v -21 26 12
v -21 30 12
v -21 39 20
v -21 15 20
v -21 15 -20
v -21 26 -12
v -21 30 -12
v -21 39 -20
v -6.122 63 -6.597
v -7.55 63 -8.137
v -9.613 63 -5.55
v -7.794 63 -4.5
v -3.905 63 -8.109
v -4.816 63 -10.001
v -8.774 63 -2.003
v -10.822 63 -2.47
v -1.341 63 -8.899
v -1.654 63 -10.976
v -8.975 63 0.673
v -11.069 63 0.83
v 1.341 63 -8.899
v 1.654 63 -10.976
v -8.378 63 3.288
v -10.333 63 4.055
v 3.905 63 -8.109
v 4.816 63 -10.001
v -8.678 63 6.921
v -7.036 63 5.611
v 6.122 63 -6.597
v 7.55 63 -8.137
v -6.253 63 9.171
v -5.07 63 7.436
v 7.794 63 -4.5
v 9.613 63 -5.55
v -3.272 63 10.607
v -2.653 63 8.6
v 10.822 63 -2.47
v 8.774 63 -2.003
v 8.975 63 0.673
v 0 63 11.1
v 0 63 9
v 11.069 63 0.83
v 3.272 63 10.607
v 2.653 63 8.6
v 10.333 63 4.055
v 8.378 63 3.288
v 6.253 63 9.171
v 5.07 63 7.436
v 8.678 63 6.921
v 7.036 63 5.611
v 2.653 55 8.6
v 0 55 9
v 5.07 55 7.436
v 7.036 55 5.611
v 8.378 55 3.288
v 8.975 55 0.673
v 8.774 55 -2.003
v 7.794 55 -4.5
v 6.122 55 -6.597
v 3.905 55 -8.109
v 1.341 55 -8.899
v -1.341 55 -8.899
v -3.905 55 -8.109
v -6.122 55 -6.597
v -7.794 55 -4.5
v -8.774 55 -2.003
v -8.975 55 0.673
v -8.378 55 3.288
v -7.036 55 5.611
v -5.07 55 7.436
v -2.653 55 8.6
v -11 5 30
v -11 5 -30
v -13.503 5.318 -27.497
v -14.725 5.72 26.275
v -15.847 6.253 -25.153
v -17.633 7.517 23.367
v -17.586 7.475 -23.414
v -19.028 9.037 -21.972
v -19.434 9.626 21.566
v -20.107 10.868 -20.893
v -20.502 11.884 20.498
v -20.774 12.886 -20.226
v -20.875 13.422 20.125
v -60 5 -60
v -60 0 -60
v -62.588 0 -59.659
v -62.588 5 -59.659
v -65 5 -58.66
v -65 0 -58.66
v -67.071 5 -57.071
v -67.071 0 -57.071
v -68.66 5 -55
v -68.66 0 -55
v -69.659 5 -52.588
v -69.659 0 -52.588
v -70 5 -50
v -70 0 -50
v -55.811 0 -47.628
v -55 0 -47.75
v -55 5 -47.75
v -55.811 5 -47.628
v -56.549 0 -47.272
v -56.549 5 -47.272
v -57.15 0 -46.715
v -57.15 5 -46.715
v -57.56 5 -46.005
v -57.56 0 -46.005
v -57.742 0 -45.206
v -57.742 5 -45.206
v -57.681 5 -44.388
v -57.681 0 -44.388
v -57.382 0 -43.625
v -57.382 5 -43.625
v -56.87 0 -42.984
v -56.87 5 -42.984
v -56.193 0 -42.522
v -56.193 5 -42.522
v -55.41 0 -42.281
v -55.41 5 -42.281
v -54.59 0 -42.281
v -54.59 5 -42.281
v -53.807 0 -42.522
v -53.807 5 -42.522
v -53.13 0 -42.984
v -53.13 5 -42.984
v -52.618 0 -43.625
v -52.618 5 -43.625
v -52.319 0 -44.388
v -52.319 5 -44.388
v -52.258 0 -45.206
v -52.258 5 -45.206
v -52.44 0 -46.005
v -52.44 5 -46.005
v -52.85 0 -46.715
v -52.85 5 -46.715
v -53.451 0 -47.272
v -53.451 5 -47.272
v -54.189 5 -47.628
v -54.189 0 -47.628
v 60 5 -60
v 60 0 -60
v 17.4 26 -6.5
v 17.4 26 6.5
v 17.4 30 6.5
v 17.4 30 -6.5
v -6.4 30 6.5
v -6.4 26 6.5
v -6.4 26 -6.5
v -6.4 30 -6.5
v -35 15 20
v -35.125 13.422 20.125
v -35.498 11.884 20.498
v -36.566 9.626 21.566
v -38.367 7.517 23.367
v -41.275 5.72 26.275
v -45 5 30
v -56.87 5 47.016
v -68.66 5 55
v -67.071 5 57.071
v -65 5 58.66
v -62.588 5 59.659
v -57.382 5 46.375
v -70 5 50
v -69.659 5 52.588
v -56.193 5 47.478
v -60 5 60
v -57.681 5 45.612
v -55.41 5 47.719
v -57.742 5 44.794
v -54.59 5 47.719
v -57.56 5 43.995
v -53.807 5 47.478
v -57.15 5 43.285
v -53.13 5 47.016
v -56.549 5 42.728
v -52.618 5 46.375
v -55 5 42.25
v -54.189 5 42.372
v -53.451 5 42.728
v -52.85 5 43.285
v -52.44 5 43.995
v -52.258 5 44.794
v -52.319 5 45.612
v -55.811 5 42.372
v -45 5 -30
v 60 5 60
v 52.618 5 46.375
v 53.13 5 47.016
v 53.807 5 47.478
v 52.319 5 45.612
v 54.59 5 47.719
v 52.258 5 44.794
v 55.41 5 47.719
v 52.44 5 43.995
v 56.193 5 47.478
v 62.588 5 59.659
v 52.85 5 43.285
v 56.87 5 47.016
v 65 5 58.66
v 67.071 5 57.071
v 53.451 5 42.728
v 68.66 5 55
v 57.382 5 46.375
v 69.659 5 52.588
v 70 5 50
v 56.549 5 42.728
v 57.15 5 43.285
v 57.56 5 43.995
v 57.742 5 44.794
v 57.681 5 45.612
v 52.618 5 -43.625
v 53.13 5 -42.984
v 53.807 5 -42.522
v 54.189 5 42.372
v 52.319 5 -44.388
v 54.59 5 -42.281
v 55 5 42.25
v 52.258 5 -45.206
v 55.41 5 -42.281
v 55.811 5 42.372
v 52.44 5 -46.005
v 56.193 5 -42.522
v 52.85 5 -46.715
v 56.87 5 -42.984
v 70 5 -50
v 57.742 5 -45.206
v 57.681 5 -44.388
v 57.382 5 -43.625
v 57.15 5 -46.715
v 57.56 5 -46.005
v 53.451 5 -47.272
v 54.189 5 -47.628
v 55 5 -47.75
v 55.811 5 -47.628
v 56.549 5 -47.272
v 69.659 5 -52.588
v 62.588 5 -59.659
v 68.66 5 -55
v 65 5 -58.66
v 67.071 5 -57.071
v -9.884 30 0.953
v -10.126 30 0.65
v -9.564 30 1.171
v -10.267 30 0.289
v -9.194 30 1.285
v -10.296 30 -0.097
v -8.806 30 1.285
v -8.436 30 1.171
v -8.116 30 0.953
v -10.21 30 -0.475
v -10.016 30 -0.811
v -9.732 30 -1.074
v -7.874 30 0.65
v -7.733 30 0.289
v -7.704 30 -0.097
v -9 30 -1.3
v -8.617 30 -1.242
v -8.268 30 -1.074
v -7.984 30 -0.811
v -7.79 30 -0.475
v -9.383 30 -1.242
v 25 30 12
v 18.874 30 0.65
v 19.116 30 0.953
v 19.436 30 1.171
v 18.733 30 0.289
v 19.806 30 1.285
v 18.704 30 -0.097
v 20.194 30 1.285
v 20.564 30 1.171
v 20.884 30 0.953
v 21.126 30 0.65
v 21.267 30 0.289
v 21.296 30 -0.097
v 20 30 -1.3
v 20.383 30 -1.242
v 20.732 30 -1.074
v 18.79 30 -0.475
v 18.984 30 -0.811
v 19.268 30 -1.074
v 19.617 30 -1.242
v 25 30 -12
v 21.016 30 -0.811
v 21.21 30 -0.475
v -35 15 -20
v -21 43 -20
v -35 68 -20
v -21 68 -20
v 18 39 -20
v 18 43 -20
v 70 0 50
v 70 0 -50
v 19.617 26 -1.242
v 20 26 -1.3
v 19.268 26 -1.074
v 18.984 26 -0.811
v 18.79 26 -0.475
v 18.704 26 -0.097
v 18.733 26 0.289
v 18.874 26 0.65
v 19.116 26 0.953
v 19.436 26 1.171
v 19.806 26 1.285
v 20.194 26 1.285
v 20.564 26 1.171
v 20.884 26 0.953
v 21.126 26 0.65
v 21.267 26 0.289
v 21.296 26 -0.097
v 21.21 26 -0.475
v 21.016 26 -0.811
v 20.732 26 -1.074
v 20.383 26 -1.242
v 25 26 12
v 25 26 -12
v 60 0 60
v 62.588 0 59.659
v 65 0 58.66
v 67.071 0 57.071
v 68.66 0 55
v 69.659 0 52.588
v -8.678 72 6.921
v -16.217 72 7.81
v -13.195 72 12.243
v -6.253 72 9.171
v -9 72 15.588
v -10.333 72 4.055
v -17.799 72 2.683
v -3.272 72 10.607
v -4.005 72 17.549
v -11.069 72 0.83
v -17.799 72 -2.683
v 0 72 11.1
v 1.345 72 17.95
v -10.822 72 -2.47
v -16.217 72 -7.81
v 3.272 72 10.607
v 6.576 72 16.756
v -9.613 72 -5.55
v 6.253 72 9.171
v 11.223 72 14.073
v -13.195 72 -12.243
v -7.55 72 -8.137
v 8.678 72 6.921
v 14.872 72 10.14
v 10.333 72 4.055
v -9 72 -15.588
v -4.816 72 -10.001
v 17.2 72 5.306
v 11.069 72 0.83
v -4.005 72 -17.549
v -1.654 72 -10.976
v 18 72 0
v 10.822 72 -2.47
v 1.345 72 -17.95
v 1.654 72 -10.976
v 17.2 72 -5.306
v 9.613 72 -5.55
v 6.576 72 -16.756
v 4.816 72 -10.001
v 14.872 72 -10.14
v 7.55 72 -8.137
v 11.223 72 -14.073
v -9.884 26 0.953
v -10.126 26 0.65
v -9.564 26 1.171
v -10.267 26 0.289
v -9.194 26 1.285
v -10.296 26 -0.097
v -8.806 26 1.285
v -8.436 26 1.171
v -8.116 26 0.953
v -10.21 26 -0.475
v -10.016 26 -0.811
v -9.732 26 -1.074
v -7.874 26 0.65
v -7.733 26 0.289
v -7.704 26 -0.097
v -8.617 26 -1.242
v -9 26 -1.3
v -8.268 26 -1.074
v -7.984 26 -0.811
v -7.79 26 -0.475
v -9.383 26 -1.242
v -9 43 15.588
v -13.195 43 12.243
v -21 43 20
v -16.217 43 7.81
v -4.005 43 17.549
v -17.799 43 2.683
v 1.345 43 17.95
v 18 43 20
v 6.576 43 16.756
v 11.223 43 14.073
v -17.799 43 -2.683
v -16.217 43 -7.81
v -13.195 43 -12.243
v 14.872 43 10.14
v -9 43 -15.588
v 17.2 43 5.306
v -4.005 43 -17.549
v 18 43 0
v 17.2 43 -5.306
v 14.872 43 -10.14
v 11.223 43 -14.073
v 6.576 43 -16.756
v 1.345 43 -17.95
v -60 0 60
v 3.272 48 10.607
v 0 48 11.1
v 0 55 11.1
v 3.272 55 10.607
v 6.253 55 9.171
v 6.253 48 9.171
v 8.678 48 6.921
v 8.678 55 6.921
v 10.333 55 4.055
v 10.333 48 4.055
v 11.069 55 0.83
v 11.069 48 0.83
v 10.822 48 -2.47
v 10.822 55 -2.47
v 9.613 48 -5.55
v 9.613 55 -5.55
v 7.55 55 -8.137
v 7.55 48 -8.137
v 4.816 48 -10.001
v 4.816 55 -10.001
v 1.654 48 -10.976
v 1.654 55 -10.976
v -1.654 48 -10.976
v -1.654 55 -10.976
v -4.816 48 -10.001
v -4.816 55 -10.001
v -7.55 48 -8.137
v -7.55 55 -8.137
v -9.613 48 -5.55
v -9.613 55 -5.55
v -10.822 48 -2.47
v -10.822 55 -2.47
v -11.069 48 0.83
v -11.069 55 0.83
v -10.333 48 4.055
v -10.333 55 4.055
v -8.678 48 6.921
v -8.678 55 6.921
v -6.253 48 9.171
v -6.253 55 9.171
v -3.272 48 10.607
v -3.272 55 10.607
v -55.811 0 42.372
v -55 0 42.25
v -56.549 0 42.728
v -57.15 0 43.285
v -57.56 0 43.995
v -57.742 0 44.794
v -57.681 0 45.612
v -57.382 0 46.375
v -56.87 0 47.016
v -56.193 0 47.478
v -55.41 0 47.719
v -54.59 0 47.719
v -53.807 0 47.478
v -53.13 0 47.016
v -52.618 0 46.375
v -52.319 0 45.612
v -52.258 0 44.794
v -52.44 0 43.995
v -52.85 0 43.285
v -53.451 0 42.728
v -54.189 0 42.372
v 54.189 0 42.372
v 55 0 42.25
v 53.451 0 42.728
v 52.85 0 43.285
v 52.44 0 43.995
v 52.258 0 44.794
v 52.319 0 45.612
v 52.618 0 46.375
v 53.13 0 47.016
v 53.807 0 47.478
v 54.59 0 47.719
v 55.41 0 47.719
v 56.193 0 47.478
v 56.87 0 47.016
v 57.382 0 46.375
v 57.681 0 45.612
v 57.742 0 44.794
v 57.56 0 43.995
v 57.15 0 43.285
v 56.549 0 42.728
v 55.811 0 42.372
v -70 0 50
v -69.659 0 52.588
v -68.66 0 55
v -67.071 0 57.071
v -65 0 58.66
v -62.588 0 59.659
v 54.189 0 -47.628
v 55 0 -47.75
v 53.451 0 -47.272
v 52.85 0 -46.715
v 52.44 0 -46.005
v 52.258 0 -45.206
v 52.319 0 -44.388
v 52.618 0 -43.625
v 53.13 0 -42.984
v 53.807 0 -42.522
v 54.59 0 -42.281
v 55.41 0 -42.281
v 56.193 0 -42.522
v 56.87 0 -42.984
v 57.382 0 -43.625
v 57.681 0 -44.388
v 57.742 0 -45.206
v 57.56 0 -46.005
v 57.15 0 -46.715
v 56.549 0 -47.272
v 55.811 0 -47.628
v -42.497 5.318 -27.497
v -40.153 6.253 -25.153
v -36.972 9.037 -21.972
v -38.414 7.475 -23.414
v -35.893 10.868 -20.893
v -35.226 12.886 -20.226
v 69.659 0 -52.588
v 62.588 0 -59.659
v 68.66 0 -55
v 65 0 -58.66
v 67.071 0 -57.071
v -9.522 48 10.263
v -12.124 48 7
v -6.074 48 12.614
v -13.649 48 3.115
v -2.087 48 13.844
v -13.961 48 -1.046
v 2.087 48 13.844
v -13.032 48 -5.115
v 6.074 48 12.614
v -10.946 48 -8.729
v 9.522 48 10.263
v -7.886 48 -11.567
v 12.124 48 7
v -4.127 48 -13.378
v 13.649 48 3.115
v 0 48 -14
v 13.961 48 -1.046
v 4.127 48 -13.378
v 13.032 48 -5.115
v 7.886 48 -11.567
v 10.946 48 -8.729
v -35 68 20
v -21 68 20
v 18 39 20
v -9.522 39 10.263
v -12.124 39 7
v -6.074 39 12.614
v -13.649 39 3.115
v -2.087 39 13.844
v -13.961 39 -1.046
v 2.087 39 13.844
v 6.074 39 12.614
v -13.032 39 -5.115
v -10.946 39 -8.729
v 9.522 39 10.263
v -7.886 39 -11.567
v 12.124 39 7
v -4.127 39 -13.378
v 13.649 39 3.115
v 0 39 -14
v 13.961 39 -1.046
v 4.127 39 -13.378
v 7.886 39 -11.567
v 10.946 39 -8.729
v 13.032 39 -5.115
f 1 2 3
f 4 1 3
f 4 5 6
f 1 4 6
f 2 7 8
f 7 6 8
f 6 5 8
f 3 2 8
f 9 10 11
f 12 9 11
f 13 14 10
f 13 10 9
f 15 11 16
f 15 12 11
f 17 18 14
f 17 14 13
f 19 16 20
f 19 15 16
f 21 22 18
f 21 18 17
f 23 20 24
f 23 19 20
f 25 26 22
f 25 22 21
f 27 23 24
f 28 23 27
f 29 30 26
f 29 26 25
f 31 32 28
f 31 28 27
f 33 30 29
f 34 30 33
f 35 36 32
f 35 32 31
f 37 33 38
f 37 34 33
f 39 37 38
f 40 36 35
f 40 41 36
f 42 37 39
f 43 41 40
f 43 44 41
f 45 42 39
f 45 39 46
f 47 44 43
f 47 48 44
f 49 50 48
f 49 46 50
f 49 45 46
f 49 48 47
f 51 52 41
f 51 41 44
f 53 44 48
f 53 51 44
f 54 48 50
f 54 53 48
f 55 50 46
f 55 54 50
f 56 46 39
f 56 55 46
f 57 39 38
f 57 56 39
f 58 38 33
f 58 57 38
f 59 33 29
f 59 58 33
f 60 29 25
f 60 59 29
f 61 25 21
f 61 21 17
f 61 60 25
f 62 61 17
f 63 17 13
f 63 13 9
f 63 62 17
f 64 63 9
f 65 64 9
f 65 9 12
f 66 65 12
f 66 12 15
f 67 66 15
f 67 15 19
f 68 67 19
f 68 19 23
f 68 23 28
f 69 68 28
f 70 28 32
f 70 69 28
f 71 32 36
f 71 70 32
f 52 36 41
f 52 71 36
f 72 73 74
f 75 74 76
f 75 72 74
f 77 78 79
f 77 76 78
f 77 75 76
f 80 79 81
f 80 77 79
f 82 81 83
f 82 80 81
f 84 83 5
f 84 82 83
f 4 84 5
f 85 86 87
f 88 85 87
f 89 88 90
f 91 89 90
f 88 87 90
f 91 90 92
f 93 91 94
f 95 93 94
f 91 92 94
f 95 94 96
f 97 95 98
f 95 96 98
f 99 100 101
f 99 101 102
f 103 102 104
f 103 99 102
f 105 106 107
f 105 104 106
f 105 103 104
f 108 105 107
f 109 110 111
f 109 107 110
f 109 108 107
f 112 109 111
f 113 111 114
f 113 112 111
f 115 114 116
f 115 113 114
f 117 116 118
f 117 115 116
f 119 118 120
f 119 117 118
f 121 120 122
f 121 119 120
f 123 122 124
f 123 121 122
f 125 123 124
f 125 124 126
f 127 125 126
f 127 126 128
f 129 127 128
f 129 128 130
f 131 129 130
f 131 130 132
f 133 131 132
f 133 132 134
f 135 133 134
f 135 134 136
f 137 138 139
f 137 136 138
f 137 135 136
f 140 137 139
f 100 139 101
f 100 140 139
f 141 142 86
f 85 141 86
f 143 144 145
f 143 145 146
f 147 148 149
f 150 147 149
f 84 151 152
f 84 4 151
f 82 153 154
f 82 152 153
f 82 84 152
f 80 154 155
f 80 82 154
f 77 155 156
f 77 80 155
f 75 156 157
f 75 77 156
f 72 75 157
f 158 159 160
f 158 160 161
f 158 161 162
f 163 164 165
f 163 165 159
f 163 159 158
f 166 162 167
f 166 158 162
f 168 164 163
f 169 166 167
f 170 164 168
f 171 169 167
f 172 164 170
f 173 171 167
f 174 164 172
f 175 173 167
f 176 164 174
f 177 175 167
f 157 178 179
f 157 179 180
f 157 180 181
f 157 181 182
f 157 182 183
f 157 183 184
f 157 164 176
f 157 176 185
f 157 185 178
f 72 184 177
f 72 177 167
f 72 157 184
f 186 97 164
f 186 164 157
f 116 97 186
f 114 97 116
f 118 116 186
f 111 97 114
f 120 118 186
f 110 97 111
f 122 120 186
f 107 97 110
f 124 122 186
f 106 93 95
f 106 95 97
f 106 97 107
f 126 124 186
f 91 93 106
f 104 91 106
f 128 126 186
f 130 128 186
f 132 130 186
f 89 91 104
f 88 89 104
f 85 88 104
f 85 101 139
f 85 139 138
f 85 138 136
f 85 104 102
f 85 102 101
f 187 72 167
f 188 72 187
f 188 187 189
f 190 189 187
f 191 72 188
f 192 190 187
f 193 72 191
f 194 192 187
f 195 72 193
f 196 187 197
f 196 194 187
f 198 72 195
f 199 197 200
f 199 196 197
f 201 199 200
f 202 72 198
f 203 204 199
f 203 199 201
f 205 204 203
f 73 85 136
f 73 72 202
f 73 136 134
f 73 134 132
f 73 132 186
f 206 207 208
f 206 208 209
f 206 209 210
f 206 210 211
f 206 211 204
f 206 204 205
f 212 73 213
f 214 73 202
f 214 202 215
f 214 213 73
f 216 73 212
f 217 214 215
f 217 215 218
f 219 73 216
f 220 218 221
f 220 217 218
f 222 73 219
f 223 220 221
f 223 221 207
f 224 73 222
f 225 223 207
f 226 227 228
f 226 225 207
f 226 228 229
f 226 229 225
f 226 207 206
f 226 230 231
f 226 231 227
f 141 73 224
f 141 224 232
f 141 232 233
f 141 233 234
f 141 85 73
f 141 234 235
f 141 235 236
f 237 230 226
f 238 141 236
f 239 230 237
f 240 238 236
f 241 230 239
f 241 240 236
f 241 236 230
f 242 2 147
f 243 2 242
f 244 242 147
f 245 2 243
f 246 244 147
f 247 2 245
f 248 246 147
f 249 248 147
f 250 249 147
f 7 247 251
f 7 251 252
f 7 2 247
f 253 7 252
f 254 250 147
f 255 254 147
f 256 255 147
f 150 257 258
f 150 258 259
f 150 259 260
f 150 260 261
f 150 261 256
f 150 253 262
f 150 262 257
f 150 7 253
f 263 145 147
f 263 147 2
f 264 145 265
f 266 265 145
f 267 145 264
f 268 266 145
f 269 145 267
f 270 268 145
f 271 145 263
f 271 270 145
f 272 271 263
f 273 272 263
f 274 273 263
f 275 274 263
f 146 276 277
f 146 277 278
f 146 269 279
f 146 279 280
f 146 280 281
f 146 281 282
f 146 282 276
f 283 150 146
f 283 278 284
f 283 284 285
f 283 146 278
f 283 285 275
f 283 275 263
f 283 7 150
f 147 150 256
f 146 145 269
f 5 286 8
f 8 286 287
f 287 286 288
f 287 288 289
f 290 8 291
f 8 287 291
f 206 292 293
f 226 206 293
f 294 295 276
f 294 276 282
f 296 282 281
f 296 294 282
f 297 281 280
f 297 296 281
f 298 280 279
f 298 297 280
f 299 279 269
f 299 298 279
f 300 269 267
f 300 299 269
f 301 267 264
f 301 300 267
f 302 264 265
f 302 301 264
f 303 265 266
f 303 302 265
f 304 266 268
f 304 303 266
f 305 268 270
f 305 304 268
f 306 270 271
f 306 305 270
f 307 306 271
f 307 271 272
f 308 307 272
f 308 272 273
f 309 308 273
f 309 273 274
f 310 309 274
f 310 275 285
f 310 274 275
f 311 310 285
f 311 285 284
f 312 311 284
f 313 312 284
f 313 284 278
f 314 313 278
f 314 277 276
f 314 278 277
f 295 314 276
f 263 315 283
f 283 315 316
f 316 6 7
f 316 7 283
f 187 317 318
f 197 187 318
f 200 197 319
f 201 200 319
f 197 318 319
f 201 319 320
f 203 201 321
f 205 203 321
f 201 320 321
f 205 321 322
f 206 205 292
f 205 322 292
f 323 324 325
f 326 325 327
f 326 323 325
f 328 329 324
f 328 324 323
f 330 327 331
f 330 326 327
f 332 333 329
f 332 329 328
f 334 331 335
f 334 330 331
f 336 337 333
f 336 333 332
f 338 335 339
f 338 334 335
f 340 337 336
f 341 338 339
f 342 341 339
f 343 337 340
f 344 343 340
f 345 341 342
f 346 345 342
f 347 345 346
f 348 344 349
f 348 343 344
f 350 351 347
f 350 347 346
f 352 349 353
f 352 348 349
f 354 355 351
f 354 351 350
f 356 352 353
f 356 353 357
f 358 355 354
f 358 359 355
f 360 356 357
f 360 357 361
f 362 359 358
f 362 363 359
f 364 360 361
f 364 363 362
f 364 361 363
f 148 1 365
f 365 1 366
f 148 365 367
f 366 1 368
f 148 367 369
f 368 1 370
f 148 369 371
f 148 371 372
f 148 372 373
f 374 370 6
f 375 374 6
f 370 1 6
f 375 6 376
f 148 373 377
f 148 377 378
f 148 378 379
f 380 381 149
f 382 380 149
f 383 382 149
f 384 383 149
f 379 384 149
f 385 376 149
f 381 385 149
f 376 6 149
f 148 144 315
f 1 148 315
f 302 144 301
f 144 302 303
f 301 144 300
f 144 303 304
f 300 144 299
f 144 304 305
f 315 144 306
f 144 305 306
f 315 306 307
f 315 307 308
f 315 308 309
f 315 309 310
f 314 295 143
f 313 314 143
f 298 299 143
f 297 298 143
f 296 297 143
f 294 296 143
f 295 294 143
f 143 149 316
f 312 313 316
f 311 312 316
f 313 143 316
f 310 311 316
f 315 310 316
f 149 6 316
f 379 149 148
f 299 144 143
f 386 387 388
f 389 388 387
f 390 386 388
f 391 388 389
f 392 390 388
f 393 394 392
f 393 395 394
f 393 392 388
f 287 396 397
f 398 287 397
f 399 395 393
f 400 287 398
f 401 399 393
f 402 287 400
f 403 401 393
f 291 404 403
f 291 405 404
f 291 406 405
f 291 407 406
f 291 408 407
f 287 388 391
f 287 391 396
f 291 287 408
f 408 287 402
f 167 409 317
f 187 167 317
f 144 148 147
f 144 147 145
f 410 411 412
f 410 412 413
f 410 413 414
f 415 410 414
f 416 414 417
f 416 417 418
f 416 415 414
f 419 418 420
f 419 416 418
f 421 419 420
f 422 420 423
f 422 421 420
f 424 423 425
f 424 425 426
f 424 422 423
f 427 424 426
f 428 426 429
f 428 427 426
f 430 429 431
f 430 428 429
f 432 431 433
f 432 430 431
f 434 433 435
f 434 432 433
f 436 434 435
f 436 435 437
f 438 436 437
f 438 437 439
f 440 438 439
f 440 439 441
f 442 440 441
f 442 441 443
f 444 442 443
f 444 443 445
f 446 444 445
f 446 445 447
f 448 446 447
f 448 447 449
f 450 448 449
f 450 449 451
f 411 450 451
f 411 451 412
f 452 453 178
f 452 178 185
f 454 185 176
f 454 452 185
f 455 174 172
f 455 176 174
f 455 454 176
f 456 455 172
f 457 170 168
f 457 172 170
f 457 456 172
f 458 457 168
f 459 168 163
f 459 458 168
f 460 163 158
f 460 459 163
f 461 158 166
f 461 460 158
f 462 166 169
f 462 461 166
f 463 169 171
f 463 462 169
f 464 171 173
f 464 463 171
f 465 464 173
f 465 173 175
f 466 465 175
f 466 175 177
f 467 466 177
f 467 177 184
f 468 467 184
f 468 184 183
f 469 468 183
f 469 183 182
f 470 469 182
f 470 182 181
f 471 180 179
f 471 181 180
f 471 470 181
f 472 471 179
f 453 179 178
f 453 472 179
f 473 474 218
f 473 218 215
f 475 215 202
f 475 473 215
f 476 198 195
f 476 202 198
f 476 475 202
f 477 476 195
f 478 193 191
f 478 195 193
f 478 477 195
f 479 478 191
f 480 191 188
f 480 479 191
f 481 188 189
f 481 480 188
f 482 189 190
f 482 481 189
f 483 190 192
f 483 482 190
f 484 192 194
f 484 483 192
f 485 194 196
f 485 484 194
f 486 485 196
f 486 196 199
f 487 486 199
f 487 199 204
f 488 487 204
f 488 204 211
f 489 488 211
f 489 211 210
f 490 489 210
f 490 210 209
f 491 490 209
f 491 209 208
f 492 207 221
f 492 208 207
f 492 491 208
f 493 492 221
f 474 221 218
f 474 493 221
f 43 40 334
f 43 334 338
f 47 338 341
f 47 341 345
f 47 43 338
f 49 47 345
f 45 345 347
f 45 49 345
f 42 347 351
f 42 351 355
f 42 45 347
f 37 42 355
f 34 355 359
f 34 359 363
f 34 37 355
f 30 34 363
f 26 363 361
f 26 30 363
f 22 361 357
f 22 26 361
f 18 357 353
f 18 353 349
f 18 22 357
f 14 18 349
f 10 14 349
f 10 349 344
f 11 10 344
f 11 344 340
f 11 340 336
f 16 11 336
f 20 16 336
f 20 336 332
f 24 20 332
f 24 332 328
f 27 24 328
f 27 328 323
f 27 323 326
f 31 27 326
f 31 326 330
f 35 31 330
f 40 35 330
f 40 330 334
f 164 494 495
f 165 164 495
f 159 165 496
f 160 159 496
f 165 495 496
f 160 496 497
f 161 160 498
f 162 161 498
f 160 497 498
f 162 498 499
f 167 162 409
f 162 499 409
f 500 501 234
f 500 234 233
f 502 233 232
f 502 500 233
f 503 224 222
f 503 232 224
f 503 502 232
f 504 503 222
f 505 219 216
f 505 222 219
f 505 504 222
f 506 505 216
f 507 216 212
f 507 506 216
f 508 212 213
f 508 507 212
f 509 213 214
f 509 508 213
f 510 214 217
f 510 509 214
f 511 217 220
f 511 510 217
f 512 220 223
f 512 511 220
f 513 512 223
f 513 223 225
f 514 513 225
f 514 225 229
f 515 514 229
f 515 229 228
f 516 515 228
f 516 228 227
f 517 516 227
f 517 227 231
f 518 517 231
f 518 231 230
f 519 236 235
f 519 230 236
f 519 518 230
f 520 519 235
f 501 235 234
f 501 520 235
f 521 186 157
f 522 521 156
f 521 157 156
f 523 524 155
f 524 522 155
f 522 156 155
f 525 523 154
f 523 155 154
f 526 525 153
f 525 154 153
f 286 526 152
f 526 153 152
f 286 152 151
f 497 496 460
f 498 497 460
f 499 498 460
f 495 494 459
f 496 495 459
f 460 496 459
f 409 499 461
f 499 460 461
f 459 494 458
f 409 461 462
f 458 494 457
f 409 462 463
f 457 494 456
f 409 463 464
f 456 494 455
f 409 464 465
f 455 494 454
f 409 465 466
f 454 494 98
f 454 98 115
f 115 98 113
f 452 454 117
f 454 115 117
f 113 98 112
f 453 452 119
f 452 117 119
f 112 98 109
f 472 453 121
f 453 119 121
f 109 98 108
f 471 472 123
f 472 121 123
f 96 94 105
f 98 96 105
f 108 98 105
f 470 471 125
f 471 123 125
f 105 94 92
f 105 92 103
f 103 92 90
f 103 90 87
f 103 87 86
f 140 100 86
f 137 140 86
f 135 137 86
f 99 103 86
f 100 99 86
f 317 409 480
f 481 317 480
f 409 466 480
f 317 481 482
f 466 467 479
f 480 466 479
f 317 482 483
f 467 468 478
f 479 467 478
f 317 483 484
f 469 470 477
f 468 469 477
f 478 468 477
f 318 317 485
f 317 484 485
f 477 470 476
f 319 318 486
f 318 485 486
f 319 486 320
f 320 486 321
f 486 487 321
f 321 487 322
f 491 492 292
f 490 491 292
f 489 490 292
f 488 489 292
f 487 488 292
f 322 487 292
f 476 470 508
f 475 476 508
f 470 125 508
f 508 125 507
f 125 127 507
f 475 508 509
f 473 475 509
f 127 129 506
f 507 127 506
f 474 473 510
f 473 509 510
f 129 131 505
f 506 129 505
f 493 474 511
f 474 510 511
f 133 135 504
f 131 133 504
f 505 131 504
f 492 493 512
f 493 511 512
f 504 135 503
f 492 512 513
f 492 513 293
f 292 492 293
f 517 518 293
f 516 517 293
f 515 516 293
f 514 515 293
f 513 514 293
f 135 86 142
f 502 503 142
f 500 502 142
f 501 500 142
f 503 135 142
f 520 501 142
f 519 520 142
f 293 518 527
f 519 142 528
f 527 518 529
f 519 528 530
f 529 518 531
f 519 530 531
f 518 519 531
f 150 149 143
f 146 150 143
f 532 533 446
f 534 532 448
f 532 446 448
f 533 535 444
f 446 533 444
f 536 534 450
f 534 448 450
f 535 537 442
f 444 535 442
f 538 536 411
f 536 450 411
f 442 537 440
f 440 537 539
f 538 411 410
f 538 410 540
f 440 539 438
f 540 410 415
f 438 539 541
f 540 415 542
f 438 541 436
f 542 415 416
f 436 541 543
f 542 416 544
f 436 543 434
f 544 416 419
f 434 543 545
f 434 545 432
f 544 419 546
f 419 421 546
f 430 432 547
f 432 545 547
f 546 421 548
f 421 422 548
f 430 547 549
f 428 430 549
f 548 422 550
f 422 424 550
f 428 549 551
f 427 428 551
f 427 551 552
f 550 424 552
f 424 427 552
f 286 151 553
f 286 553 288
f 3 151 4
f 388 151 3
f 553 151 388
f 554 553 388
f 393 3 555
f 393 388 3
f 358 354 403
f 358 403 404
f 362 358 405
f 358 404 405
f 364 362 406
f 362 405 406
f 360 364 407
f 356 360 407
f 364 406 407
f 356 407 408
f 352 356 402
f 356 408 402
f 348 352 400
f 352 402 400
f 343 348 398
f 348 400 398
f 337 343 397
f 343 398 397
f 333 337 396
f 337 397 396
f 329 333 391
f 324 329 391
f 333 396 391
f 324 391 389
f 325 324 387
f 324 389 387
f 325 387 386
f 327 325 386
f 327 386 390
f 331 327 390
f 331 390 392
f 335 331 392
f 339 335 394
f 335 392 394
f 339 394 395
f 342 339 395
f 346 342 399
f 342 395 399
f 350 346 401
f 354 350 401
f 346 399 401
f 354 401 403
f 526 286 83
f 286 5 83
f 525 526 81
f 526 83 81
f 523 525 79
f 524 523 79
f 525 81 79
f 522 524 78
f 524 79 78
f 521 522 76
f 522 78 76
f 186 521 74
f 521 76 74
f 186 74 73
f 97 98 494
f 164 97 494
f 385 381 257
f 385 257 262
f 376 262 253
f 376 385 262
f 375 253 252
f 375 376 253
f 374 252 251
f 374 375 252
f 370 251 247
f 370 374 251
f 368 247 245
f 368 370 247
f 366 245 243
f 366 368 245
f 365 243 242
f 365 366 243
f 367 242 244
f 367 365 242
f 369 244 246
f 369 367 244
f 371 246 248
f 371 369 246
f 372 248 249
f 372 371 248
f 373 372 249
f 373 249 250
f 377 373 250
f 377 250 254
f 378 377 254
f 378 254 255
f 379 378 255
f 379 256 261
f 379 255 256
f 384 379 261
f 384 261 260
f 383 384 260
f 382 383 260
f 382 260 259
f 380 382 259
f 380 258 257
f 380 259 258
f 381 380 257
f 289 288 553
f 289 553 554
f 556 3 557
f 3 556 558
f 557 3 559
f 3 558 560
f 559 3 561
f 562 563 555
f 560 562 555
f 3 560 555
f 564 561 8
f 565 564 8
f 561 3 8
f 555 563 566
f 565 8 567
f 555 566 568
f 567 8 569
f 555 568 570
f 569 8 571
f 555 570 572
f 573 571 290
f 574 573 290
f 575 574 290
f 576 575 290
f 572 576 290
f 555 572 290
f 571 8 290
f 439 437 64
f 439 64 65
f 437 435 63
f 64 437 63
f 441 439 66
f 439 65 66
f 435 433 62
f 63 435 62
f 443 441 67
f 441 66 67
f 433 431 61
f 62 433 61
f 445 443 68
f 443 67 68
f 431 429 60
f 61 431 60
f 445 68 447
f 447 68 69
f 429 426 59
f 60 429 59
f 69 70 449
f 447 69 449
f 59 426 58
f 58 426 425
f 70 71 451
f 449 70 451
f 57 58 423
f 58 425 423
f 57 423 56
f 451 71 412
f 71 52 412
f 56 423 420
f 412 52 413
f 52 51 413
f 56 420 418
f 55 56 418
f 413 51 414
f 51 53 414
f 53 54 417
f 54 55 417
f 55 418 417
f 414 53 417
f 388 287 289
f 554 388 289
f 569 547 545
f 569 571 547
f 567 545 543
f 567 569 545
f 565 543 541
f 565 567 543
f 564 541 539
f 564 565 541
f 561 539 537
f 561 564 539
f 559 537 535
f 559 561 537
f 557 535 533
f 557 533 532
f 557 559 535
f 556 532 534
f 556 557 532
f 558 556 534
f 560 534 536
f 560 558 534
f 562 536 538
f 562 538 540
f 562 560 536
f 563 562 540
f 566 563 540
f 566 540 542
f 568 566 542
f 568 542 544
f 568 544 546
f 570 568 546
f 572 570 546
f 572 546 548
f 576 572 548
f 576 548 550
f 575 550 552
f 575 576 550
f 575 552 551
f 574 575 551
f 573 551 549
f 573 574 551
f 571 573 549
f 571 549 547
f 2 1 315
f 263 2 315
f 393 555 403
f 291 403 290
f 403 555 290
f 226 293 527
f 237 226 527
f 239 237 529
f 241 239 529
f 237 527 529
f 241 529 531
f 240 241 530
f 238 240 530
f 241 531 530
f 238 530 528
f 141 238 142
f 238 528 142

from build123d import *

# Parameters (mm, degrees)
BENCH_FOOTPRINT_140X120_DEPTH           = 5
BACKBONE_START                          = -20
BACKBONE_PROFILE_W                      = 14
BACKBONE_PROFILE_H                      = 63
BACKBONE_DEPTH                          = 40
SERVO_SHELF_START                       = 26
SERVO_SHELF_PROFILE_W                   = 60
SERVO_SHELF_PROFILE_H                   = 24
SERVO_SHELF_DEPTH                       = 4
SERVO_BODY_WINDOW_START                 = 25
SERVO_BODY_WINDOW_PROFILE_W             = 23.8
SERVO_BODY_WINDOW_PROFILE_H             = 13
SERVO_BODY_WINDOW_DEPTH                 = 90.560027933
YAW_SERVO_FASTENERS_START               = 25
YAW_SERVO_FASTENERS_PROFILE_R           = 1.3
YAW_SERVO_FASTENERS_DEPTH               = 90.560027933
BEARING_BRIDGE_START                    = 39
BEARING_BRIDGE_PROFILE_W                = 53
BEARING_BRIDGE_PROFILE_H                = 40
BEARING_BRIDGE_DEPTH                    = 4
BRIDGE_HORN_CLEARANCE_START             = 38
BRIDGE_HORN_CLEARANCE_PROFILE_R         = 14
BRIDGE_HORN_CLEARANCE_DEPTH             = 77.560027933
DRIVE_COLLAR_CHAMBER_START              = 43
DRIVE_COLLAR_CHAMBER_PROFILE_R          = 18
DRIVE_COLLAR_CHAMBER_PROFILE_R_2        = 14
DRIVE_COLLAR_CHAMBER_DEPTH              = 5
BEARING_TOWER_START                     = 48
BEARING_TOWER_PROFILE_R                 = 18
BEARING_TOWER_PROFILE_R_2               = 11.1
BEARING_TOWER_DEPTH                     = 24
BEARING_SEPARATION_SHOULDER_START       = 55
BEARING_SEPARATION_SHOULDER_PROFILE_R   = 11.1
BEARING_SEPARATION_SHOULDER_PROFILE_R_2 = 9
BEARING_SEPARATION_SHOULDER_DEPTH       = 8
BENCH_CLAMP_HOLES_START                 = -1
BENCH_CLAMP_HOLES_PROFILE_R             = 2.75
BENCH_CLAMP_HOLES_DEPTH                 = 118.978630527
FILLET1_R                               = 10


with BuildPart() as part:
    # Bench_footprint_140x120_profile → Bench_footprint_140x120 (new body)
    with BuildSketch(Plane(origin=(0, 0, 0), x_dir=(1, 0, 0), z_dir=(0, 1, 0))):
        with BuildLine():
            Line((-60, -60), (60, -60))
            ThreePointArc((60, -60), (67.071067812, -57.071067812), (70, -50))
            Line((70, -50), (70, 50))
            ThreePointArc((70, 50), (67.071067812, 57.071067812), (60, 60))
            Line((60, 60), (-60, 60))
            ThreePointArc((-60, 60), (-67.071067812, 57.071067812), (-70, 50))
            Line((-70, 50), (-70, -50))
            ThreePointArc((-70, -50), (-67.071067812, -57.071067812), (-60, -60))
        make_face()
    extrude(amount=BENCH_FOOTPRINT_140X120_DEPTH)

    # Backbone_profile → Backbone (add)
    with BuildSketch(Plane.XY.offset(BACKBONE_START)):
        with Locations((-28, 36.5)):
            Rectangle(BACKBONE_PROFILE_W, BACKBONE_PROFILE_H)
    extrude(amount=BACKBONE_DEPTH)

    # Servo_shelf_profile → Servo_shelf (add)
    with BuildSketch(Plane(origin=(0, 0, 0), x_dir=(1, 0, 0), z_dir=(0, 1, 0)).offset(SERVO_SHELF_START)):
        with Locations((-5, 0)):
            Rectangle(SERVO_SHELF_PROFILE_W, SERVO_SHELF_PROFILE_H)
    extrude(amount=SERVO_SHELF_DEPTH)

    # Servo_body_window_profile → Servo_body_window (cut, through all)
    with BuildSketch(Plane(origin=(0, 0, 0), x_dir=(1, 0, 0), z_dir=(0, 1, 0)).offset(SERVO_BODY_WINDOW_START)):
        with Locations((5.5, 0)):
            Rectangle(SERVO_BODY_WINDOW_PROFILE_W, SERVO_BODY_WINDOW_PROFILE_H)
    extrude(amount=SERVO_BODY_WINDOW_DEPTH, mode=Mode.SUBTRACT)

    # Yaw_servo_fasteners_profile → Yaw_servo_fasteners (cut, through all)
    with BuildSketch(Plane(origin=(0, 0, 0), x_dir=(1, 0, 0), z_dir=(0, 1, 0)).offset(YAW_SERVO_FASTENERS_START)):
        with Locations(Location((-9, 0, 0), (0, 0, 90))):
            Circle(YAW_SERVO_FASTENERS_PROFILE_R)
        with Locations(Location((20, 0, 0), (0, 0, 90))):
            Circle(YAW_SERVO_FASTENERS_PROFILE_R)
    extrude(amount=YAW_SERVO_FASTENERS_DEPTH, mode=Mode.SUBTRACT)

    # Bearing_bridge_profile → Bearing_bridge (add)
    with BuildSketch(Plane(origin=(0, 0, 0), x_dir=(1, 0, 0), z_dir=(0, 1, 0)).offset(BEARING_BRIDGE_START)):
        with Locations((-8.5, 0)):
            Rectangle(BEARING_BRIDGE_PROFILE_W, BEARING_BRIDGE_PROFILE_H)
    extrude(amount=BEARING_BRIDGE_DEPTH)

    # Bridge_horn_clearance_profile → Bridge_horn_clearance (cut, through all)
    with BuildSketch(Plane(origin=(0, 0, 0), x_dir=(1, 0, 0), z_dir=(0, 1, 0)).offset(BRIDGE_HORN_CLEARANCE_START)):
        with Locations(Location((0, 0, 0), (0, 0, 90))):
            Circle(BRIDGE_HORN_CLEARANCE_PROFILE_R)
    extrude(amount=BRIDGE_HORN_CLEARANCE_DEPTH, mode=Mode.SUBTRACT)

    # Drive_collar_chamber_profile → Drive_collar_chamber (add)
    with BuildSketch(Plane(origin=(0, 0, 0), x_dir=(1, 0, 0), z_dir=(0, 1, 0)).offset(DRIVE_COLLAR_CHAMBER_START)):
        Circle(DRIVE_COLLAR_CHAMBER_PROFILE_R)
        with Locations(Location((0, 0, 0), (0, 0, 90))):
            Circle(DRIVE_COLLAR_CHAMBER_PROFILE_R_2, mode=Mode.SUBTRACT)
    extrude(amount=DRIVE_COLLAR_CHAMBER_DEPTH)

    # Bearing_tower_profile → Bearing_tower (add)
    with BuildSketch(Plane(origin=(0, 0, 0), x_dir=(1, 0, 0), z_dir=(0, 1, 0)).offset(BEARING_TOWER_START)):
        Circle(BEARING_TOWER_PROFILE_R)
        with Locations(Location((0, 0, 0), (0, 0, 270))):
            Circle(BEARING_TOWER_PROFILE_R_2, mode=Mode.SUBTRACT)
    extrude(amount=BEARING_TOWER_DEPTH)

    # Bearing_separation_shoulder_profile → Bearing_separation_shoulder (add)
    with BuildSketch(Plane(origin=(0, 0, 0), x_dir=(1, 0, 0), z_dir=(0, 1, 0)).offset(BEARING_SEPARATION_SHOULDER_START)):
        with Locations(Location((0, 0, 0), (0, 0, 270))):
            Circle(BEARING_SEPARATION_SHOULDER_PROFILE_R)
        with Locations(Location((0, 0, 0), (0, 0, 270))):
            Circle(BEARING_SEPARATION_SHOULDER_PROFILE_R_2, mode=Mode.SUBTRACT)
    extrude(amount=BEARING_SEPARATION_SHOULDER_DEPTH)

    # Bench_clamp_holes_profile → Bench_clamp_holes (cut, through all)
    with BuildSketch(Plane(origin=(0, 0, 0), x_dir=(1, 0, 0), z_dir=(0, 1, 0)).offset(BENCH_CLAMP_HOLES_START)):
        with Locations(Location((-55, -45, 0), (0, 0, 90))):
            Circle(BENCH_CLAMP_HOLES_PROFILE_R)
        with Locations(Location((55, -45, 0), (0, 0, 90))):
            Circle(BENCH_CLAMP_HOLES_PROFILE_R)
        with Locations(Location((-55, 45, 0), (0, 0, 90))):
            Circle(BENCH_CLAMP_HOLES_PROFILE_R)
        with Locations(Location((55, 45, 0), (0, 0, 90))):
            Circle(BENCH_CLAMP_HOLES_PROFILE_R)
    extrude(amount=BENCH_CLAMP_HOLES_DEPTH, mode=Mode.SUBTRACT)

    # Fillet1
    fillet1_edges = [part.edges().sort_by_distance(p)[0] for p in [
        (-28, 5, -20),
        (-35, 5, 0),
        (-21, 5, 0),
        (-28, 5, 20),
    ]]
    fillet(fillet1_edges, radius=FILLET1_R)


solid = part.part
